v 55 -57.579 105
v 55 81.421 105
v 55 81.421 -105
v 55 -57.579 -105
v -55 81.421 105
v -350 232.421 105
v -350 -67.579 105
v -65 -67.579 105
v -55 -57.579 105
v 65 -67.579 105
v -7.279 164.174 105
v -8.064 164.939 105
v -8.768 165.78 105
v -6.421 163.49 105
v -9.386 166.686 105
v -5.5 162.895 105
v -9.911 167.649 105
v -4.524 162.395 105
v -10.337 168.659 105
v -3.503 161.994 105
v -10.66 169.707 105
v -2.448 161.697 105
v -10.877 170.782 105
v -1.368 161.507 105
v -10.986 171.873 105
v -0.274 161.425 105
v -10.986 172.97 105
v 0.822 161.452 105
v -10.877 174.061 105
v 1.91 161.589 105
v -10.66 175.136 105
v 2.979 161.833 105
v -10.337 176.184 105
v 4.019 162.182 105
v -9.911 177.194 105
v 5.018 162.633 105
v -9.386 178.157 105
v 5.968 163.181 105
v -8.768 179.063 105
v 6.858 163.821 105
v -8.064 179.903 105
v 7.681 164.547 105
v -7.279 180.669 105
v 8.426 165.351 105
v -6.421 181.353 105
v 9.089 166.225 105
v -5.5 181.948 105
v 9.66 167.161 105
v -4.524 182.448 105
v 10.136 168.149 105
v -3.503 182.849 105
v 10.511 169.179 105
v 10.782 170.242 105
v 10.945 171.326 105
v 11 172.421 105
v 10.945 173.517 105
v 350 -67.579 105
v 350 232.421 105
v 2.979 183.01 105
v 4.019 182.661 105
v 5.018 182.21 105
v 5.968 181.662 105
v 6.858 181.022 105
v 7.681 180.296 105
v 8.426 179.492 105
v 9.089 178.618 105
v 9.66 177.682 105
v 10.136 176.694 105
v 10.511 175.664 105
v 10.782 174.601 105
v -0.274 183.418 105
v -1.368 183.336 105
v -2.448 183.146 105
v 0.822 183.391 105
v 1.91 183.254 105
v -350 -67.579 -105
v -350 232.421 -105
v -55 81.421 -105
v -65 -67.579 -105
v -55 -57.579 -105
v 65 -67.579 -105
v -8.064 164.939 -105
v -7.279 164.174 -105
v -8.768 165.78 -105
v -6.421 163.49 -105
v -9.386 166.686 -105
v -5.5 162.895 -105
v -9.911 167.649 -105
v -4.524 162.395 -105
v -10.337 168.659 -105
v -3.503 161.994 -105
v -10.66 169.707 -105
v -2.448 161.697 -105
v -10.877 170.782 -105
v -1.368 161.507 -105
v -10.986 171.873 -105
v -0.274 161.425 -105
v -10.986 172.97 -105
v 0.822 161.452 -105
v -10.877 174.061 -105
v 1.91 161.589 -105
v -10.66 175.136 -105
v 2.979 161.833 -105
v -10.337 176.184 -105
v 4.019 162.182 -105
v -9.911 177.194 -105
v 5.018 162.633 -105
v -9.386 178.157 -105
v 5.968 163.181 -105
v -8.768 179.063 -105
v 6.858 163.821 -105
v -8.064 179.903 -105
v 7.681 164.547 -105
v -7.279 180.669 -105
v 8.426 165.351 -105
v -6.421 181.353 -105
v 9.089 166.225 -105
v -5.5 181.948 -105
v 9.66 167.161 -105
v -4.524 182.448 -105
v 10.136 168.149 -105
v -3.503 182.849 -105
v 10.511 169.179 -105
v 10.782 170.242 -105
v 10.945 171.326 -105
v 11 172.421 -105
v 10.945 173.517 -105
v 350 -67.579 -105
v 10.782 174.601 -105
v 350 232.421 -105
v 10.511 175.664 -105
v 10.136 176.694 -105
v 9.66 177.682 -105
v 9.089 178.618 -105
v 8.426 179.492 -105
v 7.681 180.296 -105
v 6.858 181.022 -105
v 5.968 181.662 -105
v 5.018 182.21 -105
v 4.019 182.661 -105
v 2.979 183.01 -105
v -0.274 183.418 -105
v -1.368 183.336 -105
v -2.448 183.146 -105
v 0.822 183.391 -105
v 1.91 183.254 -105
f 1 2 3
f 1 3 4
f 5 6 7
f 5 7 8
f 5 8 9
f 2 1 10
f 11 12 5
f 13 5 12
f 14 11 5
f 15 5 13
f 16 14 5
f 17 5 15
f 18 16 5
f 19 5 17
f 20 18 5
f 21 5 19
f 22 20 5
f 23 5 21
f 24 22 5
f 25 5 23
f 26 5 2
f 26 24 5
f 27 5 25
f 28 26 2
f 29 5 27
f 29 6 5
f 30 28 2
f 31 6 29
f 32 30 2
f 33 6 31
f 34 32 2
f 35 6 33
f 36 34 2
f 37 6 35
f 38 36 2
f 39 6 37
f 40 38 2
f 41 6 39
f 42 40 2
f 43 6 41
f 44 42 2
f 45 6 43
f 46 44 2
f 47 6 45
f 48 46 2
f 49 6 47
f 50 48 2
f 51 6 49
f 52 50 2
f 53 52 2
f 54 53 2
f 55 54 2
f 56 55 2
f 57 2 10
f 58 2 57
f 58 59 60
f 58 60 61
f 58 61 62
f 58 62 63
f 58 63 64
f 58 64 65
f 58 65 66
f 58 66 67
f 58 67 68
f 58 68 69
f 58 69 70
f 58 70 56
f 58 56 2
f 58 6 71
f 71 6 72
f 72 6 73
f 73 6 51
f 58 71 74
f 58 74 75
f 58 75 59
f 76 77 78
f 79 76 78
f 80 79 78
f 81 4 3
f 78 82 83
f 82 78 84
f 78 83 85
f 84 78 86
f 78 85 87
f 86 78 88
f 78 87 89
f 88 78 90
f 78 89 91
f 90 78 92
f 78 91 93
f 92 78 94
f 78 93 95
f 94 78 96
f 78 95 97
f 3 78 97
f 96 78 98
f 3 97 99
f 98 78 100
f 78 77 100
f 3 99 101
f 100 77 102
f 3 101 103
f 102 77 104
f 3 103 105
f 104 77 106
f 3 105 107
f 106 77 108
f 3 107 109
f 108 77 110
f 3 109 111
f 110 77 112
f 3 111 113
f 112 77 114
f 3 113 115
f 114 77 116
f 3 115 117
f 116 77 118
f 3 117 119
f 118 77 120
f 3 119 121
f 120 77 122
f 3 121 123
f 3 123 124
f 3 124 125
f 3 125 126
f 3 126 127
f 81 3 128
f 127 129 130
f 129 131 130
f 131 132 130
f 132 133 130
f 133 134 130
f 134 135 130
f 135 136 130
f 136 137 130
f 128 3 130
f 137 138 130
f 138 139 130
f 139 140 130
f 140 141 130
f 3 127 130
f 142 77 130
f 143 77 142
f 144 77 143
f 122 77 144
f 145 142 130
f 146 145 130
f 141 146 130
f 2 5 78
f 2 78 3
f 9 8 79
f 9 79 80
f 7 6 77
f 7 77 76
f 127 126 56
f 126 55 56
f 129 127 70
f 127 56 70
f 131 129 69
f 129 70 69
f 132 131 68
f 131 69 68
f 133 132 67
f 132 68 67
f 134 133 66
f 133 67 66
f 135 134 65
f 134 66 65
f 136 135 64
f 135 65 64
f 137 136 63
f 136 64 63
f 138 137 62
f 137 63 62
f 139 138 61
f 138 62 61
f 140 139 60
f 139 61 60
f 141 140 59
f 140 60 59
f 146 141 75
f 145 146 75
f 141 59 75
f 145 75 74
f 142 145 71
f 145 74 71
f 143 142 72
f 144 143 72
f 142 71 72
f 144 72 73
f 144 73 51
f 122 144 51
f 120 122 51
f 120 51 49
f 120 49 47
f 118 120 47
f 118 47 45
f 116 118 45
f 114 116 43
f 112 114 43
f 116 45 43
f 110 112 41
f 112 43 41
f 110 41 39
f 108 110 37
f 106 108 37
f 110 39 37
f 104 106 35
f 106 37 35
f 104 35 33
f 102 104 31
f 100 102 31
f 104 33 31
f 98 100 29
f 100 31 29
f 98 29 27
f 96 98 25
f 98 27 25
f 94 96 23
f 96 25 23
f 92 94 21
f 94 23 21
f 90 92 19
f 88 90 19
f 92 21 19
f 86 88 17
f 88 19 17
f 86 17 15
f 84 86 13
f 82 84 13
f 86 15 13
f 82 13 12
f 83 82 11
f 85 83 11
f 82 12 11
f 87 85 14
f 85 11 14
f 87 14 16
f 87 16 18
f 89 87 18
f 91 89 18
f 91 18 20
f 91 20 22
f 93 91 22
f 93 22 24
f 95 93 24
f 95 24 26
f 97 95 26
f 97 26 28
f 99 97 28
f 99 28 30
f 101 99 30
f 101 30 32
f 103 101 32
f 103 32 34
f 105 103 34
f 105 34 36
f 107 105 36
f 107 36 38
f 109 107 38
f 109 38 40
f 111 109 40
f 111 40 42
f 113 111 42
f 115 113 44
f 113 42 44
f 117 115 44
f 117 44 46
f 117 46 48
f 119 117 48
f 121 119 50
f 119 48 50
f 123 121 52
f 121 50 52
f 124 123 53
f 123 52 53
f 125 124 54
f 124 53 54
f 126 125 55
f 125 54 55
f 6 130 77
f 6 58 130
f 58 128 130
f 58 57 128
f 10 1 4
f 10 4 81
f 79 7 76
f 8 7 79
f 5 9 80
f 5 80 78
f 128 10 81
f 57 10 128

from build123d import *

# Parameters (mm, degrees)
BOSS_EXTRUDE1_DEPTH     = 105
SKETCH2_R               = 11
CUT_EXTRUDE1_DEPTH      = 106
CUT_EXTRUDE1_DEPTH_BACK = 106


with BuildPart() as part:
    # Sketch1 → Boss-Extrude1 (new body, symmetric)
    with BuildSketch(Plane.XY):
        Polygon((350, 232.421392473), (-350, 232.421392473), (-350, -67.578607527), (-65, -67.578607527), (-55, -57.578607527), (-55, 81.421392473), (55, 81.421392473), (55, -57.578607527), (65, -67.578607527), (350, -67.578607527), align=None)
    extrude(amount=BOSS_EXTRUDE1_DEPTH, both=True)

    # Sketch2 → Cut-Extrude1 (cut, two sides)
    with BuildSketch(Plane.XY) as cut_extrude1_sk:
        with Locations((0, 172.421392473)):
            Circle(SKETCH2_R)
    extrude(amount=CUT_EXTRUDE1_DEPTH, mode=Mode.SUBTRACT)
    extrude(cut_extrude1_sk.sketch, amount=-CUT_EXTRUDE1_DEPTH_BACK, mode=Mode.SUBTRACT)


solid = part.part
